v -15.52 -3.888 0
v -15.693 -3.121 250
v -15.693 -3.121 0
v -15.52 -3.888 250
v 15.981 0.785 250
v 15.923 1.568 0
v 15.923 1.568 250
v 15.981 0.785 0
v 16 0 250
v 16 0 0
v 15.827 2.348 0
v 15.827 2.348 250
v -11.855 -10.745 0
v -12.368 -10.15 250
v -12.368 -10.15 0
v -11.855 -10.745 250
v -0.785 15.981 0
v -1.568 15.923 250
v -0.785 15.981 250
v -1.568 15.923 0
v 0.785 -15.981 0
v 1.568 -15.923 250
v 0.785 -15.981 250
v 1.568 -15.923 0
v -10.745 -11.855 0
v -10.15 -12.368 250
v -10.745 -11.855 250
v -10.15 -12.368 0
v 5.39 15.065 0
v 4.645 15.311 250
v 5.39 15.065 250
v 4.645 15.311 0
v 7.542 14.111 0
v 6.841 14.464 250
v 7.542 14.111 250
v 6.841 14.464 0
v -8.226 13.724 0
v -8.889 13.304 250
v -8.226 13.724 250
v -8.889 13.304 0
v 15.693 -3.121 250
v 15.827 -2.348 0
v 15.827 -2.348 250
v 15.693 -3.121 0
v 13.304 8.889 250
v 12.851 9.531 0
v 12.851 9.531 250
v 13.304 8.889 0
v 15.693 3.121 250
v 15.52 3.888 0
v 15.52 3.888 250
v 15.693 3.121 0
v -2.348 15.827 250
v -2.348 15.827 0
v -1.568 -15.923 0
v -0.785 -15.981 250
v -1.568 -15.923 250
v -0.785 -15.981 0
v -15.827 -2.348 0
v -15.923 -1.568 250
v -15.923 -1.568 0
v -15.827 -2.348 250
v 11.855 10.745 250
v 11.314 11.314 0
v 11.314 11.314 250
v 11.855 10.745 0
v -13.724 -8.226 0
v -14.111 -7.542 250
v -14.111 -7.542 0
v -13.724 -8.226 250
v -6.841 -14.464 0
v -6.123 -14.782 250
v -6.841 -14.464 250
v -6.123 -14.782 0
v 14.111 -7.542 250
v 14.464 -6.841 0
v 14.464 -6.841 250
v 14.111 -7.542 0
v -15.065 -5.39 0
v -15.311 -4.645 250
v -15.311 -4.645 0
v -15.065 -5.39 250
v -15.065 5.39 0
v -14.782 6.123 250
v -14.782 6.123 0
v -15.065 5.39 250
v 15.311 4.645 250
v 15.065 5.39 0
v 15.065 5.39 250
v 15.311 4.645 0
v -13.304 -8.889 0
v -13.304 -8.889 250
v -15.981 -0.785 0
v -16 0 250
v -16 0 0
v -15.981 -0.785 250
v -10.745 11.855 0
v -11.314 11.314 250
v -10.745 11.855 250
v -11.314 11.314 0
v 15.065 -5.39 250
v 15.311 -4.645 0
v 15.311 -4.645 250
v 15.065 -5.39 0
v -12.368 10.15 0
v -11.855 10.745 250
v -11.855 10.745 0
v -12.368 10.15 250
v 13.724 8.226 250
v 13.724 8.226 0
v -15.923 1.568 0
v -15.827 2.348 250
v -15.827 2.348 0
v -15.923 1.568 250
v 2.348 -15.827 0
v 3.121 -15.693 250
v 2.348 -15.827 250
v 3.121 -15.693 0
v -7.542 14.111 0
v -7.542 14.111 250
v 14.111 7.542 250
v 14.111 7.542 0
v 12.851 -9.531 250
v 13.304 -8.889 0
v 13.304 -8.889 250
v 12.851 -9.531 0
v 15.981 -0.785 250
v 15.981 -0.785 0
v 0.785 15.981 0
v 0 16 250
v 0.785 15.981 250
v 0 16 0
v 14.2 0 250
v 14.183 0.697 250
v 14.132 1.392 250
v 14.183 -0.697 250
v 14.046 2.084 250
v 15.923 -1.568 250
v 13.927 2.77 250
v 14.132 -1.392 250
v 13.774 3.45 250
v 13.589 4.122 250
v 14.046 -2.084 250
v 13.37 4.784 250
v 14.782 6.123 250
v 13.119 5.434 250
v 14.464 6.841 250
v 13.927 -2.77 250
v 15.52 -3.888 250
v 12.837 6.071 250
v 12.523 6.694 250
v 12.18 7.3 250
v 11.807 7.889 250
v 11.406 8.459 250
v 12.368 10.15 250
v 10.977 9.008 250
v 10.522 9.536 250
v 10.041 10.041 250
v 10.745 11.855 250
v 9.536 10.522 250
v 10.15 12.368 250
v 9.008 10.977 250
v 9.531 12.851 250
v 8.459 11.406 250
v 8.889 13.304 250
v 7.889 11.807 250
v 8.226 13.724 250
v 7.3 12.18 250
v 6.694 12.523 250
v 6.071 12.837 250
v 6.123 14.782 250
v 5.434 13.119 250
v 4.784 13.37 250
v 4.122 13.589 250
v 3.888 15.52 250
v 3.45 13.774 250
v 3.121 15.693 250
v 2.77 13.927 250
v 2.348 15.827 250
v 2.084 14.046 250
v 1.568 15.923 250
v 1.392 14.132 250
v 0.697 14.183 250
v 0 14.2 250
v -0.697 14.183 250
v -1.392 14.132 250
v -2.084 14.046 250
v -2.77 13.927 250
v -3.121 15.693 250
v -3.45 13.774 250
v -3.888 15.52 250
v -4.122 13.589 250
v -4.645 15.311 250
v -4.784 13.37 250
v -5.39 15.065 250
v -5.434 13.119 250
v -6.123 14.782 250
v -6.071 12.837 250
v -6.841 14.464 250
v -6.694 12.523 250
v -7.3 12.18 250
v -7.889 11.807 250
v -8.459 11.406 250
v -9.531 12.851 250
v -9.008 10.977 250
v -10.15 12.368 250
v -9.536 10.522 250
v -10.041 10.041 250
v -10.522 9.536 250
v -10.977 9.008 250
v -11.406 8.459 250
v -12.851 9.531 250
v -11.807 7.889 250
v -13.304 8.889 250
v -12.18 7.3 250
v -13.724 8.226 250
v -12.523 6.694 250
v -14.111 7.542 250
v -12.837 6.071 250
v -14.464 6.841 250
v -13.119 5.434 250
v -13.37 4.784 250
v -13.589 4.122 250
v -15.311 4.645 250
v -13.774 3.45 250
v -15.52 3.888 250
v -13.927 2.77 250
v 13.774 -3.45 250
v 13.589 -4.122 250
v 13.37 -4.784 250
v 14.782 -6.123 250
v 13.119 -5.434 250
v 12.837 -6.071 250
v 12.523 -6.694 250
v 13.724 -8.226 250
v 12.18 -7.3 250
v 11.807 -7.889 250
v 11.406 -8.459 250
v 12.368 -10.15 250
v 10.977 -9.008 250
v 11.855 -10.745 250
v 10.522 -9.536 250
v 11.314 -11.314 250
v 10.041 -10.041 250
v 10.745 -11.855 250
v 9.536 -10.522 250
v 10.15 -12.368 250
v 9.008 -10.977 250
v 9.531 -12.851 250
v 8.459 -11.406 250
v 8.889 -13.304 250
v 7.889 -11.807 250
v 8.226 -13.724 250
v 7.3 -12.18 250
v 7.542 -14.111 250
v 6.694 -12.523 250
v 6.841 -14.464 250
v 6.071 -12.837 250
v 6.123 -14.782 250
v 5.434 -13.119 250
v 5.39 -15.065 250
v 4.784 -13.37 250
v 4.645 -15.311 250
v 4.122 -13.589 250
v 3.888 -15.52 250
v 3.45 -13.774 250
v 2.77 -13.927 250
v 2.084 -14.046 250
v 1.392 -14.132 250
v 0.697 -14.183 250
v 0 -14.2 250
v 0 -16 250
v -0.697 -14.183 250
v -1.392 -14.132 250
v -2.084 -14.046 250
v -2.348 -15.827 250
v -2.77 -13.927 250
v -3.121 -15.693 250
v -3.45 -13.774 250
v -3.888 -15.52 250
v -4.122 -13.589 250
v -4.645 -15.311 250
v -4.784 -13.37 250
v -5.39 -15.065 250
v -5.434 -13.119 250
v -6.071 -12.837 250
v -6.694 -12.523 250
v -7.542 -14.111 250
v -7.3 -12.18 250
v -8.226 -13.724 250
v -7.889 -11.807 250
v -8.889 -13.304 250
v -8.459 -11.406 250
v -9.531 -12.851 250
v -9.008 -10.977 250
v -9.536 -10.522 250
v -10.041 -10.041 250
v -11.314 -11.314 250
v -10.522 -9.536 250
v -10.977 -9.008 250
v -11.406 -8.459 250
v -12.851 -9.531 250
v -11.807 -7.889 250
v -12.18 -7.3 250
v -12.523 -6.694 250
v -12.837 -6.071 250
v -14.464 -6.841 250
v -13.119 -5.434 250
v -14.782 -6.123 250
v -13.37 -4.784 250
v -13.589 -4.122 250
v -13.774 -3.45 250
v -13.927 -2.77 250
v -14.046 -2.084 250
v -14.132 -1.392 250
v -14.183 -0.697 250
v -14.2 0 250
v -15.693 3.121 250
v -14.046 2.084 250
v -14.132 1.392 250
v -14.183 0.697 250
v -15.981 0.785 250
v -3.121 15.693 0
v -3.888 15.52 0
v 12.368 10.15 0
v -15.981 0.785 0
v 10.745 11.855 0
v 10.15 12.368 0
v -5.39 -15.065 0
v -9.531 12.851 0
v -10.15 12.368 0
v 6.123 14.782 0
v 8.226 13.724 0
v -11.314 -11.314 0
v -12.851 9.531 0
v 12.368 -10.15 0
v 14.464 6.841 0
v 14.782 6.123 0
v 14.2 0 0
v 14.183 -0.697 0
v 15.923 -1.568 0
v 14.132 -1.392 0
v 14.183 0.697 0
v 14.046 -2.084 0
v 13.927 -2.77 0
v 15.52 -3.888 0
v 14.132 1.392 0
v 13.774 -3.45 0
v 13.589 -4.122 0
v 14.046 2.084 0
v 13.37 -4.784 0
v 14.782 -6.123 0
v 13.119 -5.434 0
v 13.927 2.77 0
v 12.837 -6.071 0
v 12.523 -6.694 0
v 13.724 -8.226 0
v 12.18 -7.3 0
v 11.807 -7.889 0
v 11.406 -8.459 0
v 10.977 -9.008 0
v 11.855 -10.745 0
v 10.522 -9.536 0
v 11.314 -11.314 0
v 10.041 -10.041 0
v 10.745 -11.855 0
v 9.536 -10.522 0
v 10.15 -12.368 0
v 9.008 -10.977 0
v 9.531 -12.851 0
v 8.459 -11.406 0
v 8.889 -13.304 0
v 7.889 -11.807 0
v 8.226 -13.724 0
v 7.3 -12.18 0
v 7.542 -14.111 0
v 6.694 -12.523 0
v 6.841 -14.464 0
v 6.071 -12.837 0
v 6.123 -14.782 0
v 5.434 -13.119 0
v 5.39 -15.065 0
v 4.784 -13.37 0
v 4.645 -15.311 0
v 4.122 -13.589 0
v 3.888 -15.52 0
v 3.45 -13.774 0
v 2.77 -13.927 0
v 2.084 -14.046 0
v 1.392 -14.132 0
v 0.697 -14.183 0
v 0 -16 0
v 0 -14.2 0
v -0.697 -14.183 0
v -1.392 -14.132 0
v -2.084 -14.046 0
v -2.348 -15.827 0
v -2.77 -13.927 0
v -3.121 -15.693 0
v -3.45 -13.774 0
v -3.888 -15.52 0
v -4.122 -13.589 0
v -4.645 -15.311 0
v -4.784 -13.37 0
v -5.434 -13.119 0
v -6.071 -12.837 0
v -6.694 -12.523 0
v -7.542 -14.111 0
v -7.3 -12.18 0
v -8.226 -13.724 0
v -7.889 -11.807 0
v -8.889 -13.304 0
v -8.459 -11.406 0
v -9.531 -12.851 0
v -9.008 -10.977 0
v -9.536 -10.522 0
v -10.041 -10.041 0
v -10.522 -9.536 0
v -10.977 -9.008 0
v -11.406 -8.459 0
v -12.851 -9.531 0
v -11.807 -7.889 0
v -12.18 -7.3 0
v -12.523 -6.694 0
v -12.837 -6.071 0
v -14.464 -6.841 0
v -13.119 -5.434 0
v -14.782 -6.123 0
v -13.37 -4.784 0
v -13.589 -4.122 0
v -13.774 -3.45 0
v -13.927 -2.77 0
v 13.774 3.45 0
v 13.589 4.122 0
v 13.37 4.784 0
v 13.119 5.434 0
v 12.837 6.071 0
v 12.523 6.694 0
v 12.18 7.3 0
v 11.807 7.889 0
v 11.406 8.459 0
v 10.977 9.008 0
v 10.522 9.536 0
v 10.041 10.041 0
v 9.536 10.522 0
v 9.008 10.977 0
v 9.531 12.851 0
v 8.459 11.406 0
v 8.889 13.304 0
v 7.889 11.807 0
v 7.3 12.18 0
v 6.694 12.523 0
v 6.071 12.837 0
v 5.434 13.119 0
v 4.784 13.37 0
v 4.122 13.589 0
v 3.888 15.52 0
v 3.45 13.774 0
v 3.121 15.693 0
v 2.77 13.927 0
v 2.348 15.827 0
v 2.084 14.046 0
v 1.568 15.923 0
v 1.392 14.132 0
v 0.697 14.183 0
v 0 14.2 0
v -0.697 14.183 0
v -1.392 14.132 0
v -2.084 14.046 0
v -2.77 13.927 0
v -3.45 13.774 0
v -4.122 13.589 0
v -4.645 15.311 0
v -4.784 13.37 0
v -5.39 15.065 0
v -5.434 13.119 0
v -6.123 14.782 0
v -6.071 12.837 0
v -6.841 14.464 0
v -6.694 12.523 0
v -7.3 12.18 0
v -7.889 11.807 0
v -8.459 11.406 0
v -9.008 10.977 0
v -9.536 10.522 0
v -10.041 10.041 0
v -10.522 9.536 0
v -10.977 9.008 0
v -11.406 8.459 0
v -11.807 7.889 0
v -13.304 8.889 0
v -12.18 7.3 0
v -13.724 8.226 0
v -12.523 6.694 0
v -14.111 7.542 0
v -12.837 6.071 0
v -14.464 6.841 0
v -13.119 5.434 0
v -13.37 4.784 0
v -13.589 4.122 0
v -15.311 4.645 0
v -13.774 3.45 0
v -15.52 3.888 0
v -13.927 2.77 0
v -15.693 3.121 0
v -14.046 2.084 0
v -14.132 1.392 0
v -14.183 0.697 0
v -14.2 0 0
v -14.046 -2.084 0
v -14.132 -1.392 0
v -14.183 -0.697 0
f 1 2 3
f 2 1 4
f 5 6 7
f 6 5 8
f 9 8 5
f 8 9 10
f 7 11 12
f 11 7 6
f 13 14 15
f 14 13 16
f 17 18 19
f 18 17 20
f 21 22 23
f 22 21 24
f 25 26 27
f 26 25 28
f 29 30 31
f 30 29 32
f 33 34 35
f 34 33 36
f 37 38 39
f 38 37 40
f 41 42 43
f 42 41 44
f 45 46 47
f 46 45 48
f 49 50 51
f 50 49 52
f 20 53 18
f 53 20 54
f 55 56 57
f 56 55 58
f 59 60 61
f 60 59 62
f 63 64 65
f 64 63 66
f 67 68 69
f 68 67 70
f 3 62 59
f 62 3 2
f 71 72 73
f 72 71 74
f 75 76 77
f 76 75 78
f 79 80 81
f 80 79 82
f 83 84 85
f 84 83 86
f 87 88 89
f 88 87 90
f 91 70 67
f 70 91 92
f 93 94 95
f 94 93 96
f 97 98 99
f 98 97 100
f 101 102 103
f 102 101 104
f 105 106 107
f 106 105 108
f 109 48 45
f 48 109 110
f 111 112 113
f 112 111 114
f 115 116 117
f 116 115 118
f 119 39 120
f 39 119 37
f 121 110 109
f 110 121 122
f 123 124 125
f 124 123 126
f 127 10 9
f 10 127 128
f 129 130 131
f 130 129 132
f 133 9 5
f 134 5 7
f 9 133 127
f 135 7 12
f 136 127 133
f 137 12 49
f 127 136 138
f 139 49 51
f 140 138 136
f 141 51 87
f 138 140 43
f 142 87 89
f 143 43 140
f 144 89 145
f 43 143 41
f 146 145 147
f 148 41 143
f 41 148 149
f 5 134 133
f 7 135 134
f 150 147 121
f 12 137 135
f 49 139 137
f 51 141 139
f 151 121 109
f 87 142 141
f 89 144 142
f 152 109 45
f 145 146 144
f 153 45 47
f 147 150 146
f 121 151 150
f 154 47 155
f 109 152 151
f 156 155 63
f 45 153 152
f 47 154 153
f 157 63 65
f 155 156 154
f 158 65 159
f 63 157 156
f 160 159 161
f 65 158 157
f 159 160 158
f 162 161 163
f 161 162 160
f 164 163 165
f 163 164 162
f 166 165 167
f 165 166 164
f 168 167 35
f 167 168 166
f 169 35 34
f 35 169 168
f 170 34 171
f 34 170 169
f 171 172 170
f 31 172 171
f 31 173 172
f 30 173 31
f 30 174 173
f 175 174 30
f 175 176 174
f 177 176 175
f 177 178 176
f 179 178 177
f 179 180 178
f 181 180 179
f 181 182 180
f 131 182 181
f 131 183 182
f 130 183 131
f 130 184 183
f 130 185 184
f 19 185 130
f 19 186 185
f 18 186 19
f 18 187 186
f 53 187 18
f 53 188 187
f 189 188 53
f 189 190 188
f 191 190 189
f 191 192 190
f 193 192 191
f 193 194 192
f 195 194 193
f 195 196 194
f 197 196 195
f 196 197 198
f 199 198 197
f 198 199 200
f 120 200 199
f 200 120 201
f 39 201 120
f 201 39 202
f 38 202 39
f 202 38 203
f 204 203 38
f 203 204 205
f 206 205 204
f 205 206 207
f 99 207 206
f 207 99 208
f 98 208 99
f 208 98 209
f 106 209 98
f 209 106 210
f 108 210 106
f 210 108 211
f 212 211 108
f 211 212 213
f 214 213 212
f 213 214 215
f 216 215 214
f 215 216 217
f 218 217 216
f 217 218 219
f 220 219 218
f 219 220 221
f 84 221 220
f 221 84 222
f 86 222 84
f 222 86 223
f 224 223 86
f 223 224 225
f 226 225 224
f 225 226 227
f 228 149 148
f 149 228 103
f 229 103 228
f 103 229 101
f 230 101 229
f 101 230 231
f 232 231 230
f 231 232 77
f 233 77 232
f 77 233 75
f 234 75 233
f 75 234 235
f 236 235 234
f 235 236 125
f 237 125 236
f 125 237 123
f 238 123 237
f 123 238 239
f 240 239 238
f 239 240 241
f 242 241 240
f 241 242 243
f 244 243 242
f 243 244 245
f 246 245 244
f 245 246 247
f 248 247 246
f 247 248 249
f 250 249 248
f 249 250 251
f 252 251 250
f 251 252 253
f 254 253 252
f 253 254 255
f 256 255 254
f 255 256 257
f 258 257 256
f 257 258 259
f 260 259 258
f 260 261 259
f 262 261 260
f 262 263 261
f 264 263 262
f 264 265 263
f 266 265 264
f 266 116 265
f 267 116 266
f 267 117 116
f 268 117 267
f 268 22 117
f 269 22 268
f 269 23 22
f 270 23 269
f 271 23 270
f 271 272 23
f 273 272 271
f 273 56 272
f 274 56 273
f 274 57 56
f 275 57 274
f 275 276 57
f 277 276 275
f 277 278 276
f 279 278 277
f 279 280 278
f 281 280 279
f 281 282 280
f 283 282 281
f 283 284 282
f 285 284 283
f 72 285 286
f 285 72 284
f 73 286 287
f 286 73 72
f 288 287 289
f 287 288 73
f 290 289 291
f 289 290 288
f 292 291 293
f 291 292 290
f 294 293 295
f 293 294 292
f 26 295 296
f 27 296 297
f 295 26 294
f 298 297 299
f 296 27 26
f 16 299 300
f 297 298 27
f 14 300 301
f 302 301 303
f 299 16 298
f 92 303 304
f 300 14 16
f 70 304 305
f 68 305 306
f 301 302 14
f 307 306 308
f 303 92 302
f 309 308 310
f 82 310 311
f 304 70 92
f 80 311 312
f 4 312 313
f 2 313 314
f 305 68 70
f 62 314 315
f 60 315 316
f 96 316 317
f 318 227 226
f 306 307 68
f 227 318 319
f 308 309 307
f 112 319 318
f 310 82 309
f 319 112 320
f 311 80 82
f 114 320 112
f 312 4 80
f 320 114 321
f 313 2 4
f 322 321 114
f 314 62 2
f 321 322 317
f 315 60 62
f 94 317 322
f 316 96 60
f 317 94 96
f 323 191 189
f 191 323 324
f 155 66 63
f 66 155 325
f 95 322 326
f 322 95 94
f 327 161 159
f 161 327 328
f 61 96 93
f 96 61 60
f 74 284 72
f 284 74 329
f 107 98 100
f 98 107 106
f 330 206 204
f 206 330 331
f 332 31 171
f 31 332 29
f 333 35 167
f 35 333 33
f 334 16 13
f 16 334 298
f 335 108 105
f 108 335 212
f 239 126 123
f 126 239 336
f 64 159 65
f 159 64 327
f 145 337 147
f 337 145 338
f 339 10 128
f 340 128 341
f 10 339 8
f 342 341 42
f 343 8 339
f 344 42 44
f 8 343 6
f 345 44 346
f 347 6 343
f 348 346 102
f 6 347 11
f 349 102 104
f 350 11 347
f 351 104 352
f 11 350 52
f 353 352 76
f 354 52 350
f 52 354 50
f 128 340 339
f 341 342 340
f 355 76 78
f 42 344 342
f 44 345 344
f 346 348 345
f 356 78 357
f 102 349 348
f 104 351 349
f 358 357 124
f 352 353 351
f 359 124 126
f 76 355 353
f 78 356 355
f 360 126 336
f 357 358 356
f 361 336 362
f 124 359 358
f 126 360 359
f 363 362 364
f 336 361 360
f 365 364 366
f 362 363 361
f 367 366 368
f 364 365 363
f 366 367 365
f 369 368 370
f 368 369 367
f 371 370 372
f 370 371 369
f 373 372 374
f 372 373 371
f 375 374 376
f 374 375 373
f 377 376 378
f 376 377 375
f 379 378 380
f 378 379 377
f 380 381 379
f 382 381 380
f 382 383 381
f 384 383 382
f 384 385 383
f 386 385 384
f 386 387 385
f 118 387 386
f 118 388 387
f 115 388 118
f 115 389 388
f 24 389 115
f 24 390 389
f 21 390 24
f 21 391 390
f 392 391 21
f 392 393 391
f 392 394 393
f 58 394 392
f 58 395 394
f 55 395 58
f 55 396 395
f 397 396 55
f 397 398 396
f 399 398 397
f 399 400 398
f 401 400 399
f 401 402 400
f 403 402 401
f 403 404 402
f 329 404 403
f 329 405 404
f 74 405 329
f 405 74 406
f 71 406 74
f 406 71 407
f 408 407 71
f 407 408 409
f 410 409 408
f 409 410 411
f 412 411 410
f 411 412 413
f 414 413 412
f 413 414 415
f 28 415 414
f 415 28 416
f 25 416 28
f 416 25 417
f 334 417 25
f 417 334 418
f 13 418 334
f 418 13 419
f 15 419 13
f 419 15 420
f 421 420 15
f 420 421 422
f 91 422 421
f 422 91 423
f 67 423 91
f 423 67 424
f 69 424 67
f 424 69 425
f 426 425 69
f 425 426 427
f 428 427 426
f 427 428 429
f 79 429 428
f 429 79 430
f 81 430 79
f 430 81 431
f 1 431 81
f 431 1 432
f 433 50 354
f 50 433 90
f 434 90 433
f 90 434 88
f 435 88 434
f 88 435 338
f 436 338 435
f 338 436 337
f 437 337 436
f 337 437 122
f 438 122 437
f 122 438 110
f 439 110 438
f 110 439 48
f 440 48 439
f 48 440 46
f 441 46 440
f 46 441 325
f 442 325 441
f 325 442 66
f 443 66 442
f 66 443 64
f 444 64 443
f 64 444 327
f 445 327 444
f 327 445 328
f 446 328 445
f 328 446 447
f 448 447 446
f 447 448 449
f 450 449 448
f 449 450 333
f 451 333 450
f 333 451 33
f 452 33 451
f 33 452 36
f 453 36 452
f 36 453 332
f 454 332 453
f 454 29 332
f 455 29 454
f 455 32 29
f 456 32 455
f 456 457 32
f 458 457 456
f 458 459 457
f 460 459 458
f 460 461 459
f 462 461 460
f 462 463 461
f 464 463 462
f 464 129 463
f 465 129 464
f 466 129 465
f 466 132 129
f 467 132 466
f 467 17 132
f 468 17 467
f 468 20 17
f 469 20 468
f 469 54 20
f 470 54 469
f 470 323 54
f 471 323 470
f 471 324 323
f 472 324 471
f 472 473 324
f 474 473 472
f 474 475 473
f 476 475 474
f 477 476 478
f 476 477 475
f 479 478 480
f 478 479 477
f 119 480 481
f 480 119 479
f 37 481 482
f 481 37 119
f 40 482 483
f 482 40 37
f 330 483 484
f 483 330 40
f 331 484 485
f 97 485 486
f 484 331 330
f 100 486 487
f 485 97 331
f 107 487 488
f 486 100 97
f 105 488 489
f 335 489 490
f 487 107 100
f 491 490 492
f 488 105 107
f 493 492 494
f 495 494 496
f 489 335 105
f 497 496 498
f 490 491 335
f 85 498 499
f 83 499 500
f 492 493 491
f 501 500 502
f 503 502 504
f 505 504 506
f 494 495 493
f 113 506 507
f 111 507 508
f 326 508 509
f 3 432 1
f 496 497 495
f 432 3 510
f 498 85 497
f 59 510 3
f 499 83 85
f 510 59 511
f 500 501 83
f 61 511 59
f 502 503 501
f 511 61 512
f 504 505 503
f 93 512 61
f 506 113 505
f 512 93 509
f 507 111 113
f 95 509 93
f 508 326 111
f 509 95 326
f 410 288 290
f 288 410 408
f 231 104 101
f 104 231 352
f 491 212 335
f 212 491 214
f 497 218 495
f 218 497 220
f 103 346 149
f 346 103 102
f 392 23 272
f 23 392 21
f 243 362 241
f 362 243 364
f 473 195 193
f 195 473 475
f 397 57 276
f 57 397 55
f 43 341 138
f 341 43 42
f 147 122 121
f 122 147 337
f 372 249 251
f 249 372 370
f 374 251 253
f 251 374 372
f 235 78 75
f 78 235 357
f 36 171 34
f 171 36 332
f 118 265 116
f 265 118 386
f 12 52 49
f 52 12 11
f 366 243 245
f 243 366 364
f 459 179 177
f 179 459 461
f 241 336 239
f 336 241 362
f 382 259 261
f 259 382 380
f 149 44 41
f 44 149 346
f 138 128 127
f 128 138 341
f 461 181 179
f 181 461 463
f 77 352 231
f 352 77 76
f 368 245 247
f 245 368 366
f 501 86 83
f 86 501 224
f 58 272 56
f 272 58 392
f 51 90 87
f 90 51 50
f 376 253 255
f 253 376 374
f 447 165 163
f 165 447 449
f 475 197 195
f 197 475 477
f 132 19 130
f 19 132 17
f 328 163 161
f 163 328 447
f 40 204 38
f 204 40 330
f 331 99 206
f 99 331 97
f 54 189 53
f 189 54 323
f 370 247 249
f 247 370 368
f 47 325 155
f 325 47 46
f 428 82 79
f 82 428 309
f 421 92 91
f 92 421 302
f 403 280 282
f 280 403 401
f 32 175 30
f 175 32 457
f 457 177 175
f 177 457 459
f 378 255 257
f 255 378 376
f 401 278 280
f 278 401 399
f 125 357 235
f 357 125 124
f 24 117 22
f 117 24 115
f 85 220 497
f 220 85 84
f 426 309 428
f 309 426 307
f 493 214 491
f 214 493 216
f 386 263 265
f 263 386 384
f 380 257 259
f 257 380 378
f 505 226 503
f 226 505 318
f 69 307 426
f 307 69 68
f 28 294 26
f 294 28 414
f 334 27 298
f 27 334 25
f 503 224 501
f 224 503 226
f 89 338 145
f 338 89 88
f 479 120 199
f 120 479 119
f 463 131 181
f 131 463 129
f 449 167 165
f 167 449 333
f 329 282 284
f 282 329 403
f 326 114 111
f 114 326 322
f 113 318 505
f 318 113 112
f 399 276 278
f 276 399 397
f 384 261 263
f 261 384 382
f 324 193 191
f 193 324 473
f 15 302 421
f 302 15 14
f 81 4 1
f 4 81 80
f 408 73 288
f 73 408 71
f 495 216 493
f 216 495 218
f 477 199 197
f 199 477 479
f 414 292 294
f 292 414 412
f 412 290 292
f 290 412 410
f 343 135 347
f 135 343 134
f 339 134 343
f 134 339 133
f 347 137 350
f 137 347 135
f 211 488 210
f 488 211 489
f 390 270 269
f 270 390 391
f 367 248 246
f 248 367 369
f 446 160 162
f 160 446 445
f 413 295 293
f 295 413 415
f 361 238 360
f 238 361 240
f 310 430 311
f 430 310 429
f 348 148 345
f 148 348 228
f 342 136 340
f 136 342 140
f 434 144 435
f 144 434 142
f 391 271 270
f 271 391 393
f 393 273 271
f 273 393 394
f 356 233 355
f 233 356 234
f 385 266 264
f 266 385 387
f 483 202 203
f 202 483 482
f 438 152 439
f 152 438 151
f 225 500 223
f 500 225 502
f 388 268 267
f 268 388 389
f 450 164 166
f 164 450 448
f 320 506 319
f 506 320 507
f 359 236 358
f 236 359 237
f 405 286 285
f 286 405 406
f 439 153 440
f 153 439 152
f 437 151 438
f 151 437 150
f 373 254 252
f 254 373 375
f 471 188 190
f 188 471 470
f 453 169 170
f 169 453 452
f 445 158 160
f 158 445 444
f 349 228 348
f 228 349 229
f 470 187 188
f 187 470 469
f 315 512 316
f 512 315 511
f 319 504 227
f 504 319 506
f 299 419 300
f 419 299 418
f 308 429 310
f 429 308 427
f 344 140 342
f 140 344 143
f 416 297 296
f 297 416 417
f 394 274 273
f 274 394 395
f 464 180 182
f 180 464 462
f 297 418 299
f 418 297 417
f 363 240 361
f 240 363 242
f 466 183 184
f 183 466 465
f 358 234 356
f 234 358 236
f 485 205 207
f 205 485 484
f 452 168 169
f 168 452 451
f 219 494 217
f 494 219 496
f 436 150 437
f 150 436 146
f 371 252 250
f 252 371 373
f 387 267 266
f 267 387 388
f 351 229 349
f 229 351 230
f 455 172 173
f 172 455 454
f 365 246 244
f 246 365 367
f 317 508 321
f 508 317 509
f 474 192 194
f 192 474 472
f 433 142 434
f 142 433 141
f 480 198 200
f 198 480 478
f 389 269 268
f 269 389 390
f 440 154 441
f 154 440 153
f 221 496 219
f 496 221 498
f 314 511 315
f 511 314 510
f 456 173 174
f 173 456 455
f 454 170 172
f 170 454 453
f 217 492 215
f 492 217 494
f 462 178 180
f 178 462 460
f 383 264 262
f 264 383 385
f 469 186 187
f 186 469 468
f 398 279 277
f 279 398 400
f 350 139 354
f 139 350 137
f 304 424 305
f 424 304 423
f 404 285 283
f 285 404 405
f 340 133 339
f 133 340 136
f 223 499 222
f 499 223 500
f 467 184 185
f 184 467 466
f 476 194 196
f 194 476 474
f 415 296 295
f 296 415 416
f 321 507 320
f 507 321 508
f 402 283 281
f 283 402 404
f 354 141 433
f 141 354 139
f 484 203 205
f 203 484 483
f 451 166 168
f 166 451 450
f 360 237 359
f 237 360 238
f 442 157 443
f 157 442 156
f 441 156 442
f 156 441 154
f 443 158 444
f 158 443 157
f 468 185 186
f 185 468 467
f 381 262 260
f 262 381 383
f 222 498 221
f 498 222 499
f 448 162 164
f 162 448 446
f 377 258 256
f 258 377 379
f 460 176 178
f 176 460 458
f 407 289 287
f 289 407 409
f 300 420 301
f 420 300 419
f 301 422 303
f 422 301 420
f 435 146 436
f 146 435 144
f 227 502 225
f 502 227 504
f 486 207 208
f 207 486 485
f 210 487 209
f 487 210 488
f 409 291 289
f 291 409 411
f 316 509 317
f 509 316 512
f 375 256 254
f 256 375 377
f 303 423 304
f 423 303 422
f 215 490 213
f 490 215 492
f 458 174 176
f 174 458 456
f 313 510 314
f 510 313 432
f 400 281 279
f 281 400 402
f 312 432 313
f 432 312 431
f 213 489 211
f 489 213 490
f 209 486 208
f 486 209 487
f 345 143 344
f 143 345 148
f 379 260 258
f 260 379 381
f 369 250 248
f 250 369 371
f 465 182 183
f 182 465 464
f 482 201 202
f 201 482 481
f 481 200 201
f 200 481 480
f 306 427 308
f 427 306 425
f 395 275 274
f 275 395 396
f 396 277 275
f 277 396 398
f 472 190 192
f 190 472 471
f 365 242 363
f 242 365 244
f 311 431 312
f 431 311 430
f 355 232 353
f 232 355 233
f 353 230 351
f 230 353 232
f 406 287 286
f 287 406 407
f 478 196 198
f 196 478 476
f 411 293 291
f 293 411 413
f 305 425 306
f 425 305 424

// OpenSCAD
$fn = 128;

// HT 32 pipe (approx.): OD 32 mm, wall 1.8 mm, length 250 mm
od = 32;
wall = 1.8;
id = od - 2*wall;
len = 250;

difference() {
  cylinder(h = len, d = od);
  translate([0,0,-0.1]) cylinder(h = len + 0.2, d = id);
}
